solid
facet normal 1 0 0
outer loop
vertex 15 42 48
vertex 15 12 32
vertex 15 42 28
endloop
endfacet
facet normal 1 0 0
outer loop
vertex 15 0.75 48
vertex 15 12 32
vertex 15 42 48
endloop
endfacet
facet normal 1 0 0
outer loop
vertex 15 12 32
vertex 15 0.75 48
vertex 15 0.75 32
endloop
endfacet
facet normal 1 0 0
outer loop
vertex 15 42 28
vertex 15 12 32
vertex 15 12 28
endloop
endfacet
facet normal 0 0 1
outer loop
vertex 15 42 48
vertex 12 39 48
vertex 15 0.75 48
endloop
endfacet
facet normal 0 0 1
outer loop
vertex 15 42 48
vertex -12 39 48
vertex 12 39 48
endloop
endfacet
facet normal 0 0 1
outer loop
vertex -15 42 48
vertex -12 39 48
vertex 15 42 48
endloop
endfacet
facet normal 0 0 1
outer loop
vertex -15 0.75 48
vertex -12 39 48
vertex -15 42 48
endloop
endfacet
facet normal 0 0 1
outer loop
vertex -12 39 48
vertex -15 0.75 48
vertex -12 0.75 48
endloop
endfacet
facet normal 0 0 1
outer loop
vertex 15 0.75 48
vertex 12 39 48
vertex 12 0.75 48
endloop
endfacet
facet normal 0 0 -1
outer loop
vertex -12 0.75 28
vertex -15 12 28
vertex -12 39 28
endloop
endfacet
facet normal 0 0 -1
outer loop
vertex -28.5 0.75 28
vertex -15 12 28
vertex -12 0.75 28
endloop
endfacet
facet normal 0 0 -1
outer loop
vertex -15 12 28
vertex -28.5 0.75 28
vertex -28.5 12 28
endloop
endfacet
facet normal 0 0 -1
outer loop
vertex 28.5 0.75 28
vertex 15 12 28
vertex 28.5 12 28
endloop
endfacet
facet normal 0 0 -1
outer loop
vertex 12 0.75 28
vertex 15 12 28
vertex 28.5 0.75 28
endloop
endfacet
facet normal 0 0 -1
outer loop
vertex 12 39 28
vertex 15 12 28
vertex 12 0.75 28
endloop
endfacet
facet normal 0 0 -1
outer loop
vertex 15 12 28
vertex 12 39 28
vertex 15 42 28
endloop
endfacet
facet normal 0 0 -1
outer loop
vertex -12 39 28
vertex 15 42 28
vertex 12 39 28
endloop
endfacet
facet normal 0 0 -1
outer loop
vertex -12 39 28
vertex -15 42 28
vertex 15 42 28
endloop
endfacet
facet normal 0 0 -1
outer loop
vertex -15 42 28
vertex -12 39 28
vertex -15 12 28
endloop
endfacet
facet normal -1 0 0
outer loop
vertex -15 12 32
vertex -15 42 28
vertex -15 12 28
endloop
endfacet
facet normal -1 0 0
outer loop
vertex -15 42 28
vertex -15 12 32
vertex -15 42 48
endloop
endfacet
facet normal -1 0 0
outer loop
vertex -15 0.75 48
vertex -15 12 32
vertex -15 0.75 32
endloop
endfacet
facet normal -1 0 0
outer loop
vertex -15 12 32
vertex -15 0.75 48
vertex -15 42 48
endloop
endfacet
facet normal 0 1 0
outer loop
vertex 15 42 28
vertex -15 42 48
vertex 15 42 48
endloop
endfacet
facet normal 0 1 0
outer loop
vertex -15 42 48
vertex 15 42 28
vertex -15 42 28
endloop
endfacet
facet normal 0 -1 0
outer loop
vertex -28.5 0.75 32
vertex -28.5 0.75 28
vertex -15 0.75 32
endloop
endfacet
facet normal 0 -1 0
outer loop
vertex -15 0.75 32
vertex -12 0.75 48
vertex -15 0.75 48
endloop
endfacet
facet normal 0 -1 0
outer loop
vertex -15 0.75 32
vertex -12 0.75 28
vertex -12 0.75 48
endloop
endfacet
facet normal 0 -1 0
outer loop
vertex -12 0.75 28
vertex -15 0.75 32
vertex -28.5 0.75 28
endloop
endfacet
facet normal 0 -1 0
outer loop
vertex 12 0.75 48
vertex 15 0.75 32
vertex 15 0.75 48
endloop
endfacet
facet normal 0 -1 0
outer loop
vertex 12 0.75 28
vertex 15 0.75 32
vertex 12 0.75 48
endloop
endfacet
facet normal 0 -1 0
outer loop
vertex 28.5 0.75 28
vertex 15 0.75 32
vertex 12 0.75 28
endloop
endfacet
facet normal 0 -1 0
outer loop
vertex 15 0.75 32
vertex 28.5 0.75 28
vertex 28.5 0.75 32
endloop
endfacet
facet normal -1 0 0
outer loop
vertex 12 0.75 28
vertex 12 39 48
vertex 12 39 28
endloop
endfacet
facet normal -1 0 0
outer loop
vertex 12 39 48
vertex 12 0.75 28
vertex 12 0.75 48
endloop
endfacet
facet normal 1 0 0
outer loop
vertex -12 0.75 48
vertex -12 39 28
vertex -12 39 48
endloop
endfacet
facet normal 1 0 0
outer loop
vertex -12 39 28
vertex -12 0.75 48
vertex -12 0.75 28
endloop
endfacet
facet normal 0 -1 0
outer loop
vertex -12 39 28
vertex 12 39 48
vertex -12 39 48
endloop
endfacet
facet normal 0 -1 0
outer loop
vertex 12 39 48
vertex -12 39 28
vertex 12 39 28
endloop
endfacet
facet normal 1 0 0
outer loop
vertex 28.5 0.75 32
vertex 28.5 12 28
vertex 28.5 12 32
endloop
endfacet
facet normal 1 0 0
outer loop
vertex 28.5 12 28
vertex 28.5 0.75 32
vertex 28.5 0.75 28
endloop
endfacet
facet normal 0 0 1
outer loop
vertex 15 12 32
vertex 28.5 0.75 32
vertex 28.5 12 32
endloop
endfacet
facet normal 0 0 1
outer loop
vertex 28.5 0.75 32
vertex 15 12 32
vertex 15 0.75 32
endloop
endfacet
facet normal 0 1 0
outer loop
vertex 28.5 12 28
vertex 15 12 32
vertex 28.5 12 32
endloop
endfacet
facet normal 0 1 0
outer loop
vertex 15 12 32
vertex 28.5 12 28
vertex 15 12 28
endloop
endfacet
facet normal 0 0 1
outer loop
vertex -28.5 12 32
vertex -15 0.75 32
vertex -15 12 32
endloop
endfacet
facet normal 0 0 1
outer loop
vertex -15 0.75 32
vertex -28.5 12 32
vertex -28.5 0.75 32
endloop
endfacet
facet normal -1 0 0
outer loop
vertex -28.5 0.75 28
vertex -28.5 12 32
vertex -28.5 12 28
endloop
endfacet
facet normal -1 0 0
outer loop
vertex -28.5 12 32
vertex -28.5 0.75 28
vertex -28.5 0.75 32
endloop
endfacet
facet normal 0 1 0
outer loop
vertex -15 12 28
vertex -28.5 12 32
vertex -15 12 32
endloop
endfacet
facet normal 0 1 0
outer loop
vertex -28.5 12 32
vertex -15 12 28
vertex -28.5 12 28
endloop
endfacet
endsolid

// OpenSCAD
//%import("C:/Users/UO251069/Desktop/BattRack.stl");
module BattRack(){
    
difference(){
    translate([-15,0.75,28])
        cube([30,41.25,20]);
    translate([-12,0,27])
        cube([24,39,22]);
}

translate([15,0.75,28])
cube([13.5,11.25,4]);
translate([-28.5,0.75,28])
cube([13.5,11.25,4]);
}

BattRack();
